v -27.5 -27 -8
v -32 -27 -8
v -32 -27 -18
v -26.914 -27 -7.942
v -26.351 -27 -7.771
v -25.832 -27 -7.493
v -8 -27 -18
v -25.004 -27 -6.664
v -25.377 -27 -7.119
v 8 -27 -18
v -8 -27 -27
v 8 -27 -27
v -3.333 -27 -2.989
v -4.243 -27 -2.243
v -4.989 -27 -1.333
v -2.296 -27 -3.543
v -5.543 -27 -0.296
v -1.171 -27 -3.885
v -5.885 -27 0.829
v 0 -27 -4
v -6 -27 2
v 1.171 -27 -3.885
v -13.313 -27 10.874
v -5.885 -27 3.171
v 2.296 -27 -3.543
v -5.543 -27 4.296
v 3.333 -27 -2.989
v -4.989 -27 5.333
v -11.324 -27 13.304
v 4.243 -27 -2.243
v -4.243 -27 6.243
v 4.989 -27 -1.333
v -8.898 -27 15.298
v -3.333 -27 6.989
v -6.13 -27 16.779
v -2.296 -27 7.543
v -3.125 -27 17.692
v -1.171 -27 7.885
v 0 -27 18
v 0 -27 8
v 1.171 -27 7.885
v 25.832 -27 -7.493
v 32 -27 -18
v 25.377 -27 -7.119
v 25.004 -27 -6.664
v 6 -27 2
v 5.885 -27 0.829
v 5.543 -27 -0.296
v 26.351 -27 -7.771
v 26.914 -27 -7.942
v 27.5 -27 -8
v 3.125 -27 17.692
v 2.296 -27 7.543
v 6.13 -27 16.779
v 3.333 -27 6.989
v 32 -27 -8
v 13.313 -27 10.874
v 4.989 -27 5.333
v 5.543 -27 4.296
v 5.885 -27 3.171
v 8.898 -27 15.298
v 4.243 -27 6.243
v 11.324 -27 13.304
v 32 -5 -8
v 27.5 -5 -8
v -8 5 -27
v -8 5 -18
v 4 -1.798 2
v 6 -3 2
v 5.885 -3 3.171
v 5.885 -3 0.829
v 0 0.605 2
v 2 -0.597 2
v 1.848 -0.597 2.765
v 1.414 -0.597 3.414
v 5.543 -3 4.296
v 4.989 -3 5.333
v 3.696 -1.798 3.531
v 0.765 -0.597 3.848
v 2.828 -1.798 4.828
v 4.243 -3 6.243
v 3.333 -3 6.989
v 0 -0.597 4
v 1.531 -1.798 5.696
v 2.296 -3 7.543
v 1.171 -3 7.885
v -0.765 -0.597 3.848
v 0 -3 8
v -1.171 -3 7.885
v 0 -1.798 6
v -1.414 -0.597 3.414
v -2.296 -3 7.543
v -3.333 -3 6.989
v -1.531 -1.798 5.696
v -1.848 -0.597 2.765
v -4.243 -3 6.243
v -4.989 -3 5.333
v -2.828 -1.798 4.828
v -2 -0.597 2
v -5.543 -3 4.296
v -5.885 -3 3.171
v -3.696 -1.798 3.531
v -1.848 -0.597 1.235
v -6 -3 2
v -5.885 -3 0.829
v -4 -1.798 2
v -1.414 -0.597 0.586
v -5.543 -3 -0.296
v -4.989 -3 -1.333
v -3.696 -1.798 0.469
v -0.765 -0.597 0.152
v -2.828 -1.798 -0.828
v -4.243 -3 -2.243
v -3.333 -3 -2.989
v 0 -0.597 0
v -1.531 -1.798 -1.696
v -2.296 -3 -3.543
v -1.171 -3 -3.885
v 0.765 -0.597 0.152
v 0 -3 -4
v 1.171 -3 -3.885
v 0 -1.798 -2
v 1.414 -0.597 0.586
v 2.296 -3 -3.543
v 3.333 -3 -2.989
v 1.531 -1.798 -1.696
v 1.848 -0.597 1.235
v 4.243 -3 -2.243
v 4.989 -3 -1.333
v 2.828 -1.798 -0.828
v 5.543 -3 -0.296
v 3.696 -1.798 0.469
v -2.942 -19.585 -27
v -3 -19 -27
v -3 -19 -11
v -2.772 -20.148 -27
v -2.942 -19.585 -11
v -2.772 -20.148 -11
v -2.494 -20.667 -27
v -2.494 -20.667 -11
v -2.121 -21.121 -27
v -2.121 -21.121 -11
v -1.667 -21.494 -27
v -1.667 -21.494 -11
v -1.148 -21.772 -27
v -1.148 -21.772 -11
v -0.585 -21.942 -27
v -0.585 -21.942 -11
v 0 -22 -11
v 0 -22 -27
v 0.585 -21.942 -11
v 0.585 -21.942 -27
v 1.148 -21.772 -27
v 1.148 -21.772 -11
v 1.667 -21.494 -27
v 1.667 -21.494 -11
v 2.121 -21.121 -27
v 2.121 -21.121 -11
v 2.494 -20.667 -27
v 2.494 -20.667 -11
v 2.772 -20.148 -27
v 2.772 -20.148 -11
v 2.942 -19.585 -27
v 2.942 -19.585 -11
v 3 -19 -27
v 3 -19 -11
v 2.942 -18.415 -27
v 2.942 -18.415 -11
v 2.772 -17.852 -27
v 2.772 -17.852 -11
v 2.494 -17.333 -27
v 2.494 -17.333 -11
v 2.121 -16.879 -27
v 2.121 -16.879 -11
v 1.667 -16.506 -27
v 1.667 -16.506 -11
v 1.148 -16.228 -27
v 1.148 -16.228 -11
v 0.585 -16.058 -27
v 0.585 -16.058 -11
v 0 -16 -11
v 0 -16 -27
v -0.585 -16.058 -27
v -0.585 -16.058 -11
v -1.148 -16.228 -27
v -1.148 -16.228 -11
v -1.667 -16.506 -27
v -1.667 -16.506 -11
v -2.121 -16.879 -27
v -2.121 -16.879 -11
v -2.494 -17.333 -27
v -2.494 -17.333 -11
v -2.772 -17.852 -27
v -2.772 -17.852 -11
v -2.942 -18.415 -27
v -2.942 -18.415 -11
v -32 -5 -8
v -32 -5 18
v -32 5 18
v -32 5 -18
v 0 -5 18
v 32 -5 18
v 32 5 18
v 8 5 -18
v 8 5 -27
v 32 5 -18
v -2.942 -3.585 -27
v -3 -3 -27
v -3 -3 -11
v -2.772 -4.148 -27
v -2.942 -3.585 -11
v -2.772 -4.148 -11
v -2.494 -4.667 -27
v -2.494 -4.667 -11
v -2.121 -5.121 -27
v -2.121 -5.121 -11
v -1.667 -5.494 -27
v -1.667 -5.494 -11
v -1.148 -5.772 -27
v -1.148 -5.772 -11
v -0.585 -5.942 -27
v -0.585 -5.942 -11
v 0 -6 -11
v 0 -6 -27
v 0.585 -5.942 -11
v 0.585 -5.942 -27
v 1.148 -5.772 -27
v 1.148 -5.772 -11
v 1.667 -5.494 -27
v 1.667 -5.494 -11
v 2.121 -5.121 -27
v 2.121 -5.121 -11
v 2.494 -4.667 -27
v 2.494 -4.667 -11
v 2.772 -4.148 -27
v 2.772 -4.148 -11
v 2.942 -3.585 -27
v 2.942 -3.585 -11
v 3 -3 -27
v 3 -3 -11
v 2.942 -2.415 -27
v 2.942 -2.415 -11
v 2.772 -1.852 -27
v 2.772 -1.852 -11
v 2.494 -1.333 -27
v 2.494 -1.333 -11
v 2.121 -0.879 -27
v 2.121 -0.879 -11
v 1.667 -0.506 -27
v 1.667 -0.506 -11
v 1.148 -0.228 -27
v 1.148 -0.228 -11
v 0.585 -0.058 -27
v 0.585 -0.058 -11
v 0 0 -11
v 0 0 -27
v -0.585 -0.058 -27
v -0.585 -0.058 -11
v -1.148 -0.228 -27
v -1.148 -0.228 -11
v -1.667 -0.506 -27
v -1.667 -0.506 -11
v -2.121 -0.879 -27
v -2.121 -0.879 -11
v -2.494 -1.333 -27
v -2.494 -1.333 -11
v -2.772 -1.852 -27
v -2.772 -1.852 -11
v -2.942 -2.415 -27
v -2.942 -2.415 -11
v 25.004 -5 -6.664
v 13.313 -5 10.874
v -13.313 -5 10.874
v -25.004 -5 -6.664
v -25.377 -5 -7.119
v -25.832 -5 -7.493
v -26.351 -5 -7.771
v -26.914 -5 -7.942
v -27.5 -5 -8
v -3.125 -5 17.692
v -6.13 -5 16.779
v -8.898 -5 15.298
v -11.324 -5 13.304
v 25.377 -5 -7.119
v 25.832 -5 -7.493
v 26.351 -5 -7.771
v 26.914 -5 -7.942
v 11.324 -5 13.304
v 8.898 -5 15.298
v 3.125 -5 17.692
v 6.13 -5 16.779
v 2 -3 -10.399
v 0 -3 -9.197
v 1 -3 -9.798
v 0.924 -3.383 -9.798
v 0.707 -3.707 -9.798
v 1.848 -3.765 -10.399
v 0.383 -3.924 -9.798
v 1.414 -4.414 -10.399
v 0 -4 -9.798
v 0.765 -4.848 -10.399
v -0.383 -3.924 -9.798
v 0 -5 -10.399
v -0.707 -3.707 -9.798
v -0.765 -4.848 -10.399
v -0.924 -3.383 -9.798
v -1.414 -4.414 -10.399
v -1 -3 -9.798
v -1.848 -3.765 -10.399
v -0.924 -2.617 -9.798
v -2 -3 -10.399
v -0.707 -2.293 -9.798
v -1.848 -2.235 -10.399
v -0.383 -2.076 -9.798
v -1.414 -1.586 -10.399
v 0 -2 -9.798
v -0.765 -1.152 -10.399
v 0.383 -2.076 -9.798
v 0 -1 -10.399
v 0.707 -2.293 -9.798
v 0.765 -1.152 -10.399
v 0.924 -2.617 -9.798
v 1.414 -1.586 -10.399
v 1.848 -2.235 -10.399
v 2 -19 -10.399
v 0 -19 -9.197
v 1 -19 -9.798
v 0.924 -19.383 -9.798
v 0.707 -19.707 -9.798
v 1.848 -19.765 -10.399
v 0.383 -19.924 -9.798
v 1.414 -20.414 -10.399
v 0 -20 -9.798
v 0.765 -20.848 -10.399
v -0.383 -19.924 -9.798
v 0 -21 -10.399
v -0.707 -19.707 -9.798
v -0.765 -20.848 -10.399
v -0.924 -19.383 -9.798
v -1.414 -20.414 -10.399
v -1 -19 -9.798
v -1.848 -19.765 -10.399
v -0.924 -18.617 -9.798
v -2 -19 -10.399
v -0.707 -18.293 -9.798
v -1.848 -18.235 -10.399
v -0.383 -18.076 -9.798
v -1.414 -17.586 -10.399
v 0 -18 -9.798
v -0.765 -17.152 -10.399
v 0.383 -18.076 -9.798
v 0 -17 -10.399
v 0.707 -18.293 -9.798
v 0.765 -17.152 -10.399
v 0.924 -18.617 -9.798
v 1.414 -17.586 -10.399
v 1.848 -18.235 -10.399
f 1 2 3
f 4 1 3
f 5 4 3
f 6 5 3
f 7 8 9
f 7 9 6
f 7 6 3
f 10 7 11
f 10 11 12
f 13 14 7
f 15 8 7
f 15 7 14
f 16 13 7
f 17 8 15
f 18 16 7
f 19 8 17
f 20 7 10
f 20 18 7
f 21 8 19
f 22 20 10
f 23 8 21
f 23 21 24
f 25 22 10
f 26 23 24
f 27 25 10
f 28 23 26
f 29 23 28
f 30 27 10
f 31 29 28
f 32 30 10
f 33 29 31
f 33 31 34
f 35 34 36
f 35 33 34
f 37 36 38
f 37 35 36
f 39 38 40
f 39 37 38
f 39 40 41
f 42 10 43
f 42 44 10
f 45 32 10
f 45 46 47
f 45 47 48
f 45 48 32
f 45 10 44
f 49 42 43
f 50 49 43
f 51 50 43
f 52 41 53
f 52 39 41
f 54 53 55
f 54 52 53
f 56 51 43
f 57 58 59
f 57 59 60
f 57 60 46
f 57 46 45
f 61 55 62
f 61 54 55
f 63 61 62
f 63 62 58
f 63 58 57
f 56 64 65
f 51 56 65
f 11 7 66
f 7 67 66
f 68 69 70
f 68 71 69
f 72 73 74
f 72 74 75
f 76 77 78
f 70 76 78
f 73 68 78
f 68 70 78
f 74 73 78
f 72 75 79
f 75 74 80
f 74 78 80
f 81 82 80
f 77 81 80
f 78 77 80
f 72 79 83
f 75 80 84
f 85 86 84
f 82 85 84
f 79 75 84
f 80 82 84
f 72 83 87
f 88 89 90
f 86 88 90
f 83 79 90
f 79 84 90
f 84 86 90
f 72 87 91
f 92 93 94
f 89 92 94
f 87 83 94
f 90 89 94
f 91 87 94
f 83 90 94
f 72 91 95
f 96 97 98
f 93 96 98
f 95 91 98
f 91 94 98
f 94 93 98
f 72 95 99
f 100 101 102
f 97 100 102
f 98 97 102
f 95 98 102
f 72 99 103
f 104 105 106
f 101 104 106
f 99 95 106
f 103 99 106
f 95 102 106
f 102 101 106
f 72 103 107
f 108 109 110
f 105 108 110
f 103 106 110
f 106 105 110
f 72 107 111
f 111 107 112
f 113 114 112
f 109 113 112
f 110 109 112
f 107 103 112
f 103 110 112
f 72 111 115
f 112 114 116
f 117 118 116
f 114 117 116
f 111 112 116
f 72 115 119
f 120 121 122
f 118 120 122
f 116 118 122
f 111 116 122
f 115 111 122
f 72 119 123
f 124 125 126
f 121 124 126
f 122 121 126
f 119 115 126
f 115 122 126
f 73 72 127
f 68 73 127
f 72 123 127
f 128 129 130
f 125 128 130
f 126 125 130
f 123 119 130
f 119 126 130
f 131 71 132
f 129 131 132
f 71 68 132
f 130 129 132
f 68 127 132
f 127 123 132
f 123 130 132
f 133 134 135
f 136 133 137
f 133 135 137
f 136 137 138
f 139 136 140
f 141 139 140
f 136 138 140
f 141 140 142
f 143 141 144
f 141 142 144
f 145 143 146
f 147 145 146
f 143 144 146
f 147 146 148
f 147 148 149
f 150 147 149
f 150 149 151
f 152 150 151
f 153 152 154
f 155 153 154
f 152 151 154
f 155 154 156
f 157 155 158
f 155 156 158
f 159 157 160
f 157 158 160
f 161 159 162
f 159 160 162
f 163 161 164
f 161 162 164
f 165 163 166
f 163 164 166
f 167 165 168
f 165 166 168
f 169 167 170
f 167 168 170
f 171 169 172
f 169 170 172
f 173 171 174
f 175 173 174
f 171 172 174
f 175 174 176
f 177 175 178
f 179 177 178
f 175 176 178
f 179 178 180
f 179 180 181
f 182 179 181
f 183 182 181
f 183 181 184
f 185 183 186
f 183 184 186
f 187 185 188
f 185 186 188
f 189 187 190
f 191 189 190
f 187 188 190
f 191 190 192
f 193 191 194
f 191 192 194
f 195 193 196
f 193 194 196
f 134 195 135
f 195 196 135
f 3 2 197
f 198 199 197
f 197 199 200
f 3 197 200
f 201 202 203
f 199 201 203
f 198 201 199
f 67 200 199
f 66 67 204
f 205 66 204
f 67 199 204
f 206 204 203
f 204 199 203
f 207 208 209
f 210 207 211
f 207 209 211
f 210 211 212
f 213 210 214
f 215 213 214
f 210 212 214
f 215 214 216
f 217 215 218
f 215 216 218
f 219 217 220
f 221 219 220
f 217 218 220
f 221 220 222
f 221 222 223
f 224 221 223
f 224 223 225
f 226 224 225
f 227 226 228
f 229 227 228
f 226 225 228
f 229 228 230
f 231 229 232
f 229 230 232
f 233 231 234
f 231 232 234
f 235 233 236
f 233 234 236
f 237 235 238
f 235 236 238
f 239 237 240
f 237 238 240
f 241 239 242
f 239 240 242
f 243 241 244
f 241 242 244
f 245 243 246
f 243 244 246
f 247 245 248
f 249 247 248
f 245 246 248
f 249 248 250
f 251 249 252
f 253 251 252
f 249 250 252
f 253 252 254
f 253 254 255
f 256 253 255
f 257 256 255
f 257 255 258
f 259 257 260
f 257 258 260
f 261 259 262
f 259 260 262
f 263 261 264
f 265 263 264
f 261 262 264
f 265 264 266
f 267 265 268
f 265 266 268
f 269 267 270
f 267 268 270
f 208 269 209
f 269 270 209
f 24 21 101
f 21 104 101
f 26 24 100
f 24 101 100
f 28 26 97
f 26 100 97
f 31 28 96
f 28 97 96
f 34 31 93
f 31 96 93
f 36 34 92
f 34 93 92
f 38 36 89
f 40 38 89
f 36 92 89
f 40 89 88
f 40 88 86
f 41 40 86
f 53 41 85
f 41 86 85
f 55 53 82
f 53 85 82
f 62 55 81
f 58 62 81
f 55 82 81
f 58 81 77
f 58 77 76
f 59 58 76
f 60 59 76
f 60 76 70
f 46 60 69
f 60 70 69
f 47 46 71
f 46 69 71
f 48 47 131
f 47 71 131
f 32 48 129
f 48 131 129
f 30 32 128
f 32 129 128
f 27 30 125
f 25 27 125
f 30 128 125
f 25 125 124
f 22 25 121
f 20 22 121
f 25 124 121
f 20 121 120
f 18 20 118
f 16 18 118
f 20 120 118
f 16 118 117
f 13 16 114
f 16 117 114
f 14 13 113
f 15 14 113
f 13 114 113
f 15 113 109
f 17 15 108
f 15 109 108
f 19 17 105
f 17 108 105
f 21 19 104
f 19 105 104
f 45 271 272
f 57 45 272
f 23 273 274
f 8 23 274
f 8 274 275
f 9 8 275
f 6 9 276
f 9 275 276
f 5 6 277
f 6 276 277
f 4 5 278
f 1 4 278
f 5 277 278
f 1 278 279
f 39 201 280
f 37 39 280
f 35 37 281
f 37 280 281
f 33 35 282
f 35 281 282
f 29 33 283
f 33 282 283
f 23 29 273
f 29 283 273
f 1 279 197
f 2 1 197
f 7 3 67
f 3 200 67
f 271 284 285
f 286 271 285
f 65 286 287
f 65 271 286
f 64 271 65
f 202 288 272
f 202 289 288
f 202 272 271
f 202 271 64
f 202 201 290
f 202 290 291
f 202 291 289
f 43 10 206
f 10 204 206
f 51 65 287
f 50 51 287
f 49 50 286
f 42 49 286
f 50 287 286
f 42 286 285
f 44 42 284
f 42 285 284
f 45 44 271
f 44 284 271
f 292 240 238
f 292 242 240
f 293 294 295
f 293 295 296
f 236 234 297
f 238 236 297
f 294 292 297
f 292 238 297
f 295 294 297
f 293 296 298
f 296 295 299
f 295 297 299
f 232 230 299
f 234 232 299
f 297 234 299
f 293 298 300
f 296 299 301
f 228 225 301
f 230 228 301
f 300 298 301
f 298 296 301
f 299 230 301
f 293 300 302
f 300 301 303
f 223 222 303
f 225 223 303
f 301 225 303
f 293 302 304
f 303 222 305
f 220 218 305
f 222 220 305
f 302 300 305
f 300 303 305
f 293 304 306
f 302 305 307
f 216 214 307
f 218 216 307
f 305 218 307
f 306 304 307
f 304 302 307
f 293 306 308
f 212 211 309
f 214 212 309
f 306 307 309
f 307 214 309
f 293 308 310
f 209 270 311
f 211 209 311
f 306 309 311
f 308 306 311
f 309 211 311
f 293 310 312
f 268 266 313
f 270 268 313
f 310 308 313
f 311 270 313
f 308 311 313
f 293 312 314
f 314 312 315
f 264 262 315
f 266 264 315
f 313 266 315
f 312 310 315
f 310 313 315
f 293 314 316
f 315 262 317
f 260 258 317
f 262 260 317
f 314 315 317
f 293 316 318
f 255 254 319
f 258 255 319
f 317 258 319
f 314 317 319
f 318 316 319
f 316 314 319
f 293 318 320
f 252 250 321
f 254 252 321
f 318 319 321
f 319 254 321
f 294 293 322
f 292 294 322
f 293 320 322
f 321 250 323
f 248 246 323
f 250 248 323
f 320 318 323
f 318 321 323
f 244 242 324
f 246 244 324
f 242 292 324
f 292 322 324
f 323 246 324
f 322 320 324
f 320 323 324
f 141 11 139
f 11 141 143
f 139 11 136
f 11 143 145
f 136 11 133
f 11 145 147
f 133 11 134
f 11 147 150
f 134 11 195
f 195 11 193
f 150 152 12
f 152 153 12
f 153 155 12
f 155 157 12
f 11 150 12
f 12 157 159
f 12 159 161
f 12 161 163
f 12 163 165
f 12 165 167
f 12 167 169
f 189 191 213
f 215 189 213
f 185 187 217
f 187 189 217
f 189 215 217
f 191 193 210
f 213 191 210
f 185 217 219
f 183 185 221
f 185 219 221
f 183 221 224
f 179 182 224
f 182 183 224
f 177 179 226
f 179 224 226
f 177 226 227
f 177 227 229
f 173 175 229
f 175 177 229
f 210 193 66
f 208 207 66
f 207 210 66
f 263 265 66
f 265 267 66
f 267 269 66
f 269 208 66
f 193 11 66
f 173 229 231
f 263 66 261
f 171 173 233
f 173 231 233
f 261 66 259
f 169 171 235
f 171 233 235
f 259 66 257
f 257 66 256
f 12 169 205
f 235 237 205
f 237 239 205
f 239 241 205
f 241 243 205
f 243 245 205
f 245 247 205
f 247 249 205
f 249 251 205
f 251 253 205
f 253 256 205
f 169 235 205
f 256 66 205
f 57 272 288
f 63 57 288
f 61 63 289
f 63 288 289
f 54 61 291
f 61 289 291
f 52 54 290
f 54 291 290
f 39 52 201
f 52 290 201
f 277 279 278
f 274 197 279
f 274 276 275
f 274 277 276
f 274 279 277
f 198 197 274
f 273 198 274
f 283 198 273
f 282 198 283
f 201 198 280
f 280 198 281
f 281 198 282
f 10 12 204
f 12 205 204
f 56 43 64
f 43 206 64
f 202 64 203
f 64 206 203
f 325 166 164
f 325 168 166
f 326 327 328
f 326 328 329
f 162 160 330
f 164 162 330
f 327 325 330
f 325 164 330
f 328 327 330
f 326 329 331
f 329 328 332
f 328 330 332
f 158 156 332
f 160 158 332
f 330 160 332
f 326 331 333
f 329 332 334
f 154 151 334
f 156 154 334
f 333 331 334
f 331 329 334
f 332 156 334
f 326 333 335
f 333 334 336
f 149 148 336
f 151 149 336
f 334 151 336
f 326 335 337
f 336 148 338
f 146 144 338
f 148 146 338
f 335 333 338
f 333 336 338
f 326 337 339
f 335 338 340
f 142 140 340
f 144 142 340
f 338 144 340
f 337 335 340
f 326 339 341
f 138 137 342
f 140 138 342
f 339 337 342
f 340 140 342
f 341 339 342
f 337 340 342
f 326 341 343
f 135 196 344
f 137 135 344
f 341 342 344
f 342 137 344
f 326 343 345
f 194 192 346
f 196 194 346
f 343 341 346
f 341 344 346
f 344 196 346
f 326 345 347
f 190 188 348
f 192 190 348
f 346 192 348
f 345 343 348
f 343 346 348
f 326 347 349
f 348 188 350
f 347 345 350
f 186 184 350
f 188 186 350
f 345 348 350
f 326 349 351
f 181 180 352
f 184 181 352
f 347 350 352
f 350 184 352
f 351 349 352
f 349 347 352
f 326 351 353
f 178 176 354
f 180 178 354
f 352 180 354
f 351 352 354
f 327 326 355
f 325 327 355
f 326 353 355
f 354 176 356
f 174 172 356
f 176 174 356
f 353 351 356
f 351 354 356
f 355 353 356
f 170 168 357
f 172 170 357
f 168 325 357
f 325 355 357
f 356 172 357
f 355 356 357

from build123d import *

# Parameters (mm, degrees)
F1_DEPTH = 5
F3_DEPTH = 22
F5_D     = 12
F5_DEPTH = 24
F5_TIP   = 3.6051637142
F7_D     = 6
F7_DEPTH = 16
F7_TIP   = 1.8025818571


with BuildPart() as f1:
    # F0 (on Front) → F1 (new body, symmetric)
    with BuildSketch(Plane.XZ):
        Polygon((32, -18), (32, 18), (-32, 18), (-32, -18), (-8, -18), (-8, -27), (8, -27), (8, -18), align=None)
    extrude(amount=F1_DEPTH, both=True)

    # F2 (on face) → F3 (join)
    with BuildSketch(Plane.XZ.offset(5)):
        with BuildLine():
            Line((-27.5, -8), (-32, -8))
            Line((-32, -8), (-32, -18))
            Line((-32, -18), (-8, -18))
            Line((-8, -18), (-8, -27))
            Line((-8, -27), (8, -27))
            Line((8, -27), (8, -18))
            Line((8, -18), (32, -18))
            Line((32, -18), (32, -8))
            Line((32, -8), (27.5, -8))
            ThreePointArc((27.5, -8), (26.0843309615, -7.6449728115), (25.0037292554, -6.6639207823))
            Line((25.0037292554, -6.6639207823), (13.3134439711, 10.8742441722))
            ThreePointArc((13.3134439711, 10.8742441722), (7.5502348479, 16.1065216741), (-5.46e-08, 18))
            ThreePointArc((-5.46e-08, 18), (-7.5502348961, 16.1065216483), (-13.3134439711, 10.8742441722))
            Line((-13.3134439711, 10.8742441722), (-25.0037292554, -6.6639207823))
            ThreePointArc((-25.0037292554, -6.6639207823), (-26.0843309615, -7.6449728115), (-27.5, -8))
        make_face()
    extrude(amount=F3_DEPTH)

    # F5
    with Locations(Plane.XZ.offset(27)):
        with Locations((0, 2)):
            Hole(F5_D / 2, depth=F5_DEPTH)
            with Locations((0, 0, -(F5_DEPTH + F5_TIP / 2))):  # 118° drill point
                Cone(0, F5_D / 2, F5_TIP, mode=Mode.SUBTRACT)

    # F7
    with Locations(Plane(origin=(0, 0, -27), x_dir=(1, 0, 0), z_dir=(0, 0, -1))):
        with Locations((0, 19), (0, 3)):
            Hole(F7_D / 2, depth=F7_DEPTH)
            with Locations((0, 0, -(F7_DEPTH + F7_TIP / 2))):  # 118° drill point
                Cone(0, F7_D / 2, F7_TIP, mode=Mode.SUBTRACT)


solid = f1.part
